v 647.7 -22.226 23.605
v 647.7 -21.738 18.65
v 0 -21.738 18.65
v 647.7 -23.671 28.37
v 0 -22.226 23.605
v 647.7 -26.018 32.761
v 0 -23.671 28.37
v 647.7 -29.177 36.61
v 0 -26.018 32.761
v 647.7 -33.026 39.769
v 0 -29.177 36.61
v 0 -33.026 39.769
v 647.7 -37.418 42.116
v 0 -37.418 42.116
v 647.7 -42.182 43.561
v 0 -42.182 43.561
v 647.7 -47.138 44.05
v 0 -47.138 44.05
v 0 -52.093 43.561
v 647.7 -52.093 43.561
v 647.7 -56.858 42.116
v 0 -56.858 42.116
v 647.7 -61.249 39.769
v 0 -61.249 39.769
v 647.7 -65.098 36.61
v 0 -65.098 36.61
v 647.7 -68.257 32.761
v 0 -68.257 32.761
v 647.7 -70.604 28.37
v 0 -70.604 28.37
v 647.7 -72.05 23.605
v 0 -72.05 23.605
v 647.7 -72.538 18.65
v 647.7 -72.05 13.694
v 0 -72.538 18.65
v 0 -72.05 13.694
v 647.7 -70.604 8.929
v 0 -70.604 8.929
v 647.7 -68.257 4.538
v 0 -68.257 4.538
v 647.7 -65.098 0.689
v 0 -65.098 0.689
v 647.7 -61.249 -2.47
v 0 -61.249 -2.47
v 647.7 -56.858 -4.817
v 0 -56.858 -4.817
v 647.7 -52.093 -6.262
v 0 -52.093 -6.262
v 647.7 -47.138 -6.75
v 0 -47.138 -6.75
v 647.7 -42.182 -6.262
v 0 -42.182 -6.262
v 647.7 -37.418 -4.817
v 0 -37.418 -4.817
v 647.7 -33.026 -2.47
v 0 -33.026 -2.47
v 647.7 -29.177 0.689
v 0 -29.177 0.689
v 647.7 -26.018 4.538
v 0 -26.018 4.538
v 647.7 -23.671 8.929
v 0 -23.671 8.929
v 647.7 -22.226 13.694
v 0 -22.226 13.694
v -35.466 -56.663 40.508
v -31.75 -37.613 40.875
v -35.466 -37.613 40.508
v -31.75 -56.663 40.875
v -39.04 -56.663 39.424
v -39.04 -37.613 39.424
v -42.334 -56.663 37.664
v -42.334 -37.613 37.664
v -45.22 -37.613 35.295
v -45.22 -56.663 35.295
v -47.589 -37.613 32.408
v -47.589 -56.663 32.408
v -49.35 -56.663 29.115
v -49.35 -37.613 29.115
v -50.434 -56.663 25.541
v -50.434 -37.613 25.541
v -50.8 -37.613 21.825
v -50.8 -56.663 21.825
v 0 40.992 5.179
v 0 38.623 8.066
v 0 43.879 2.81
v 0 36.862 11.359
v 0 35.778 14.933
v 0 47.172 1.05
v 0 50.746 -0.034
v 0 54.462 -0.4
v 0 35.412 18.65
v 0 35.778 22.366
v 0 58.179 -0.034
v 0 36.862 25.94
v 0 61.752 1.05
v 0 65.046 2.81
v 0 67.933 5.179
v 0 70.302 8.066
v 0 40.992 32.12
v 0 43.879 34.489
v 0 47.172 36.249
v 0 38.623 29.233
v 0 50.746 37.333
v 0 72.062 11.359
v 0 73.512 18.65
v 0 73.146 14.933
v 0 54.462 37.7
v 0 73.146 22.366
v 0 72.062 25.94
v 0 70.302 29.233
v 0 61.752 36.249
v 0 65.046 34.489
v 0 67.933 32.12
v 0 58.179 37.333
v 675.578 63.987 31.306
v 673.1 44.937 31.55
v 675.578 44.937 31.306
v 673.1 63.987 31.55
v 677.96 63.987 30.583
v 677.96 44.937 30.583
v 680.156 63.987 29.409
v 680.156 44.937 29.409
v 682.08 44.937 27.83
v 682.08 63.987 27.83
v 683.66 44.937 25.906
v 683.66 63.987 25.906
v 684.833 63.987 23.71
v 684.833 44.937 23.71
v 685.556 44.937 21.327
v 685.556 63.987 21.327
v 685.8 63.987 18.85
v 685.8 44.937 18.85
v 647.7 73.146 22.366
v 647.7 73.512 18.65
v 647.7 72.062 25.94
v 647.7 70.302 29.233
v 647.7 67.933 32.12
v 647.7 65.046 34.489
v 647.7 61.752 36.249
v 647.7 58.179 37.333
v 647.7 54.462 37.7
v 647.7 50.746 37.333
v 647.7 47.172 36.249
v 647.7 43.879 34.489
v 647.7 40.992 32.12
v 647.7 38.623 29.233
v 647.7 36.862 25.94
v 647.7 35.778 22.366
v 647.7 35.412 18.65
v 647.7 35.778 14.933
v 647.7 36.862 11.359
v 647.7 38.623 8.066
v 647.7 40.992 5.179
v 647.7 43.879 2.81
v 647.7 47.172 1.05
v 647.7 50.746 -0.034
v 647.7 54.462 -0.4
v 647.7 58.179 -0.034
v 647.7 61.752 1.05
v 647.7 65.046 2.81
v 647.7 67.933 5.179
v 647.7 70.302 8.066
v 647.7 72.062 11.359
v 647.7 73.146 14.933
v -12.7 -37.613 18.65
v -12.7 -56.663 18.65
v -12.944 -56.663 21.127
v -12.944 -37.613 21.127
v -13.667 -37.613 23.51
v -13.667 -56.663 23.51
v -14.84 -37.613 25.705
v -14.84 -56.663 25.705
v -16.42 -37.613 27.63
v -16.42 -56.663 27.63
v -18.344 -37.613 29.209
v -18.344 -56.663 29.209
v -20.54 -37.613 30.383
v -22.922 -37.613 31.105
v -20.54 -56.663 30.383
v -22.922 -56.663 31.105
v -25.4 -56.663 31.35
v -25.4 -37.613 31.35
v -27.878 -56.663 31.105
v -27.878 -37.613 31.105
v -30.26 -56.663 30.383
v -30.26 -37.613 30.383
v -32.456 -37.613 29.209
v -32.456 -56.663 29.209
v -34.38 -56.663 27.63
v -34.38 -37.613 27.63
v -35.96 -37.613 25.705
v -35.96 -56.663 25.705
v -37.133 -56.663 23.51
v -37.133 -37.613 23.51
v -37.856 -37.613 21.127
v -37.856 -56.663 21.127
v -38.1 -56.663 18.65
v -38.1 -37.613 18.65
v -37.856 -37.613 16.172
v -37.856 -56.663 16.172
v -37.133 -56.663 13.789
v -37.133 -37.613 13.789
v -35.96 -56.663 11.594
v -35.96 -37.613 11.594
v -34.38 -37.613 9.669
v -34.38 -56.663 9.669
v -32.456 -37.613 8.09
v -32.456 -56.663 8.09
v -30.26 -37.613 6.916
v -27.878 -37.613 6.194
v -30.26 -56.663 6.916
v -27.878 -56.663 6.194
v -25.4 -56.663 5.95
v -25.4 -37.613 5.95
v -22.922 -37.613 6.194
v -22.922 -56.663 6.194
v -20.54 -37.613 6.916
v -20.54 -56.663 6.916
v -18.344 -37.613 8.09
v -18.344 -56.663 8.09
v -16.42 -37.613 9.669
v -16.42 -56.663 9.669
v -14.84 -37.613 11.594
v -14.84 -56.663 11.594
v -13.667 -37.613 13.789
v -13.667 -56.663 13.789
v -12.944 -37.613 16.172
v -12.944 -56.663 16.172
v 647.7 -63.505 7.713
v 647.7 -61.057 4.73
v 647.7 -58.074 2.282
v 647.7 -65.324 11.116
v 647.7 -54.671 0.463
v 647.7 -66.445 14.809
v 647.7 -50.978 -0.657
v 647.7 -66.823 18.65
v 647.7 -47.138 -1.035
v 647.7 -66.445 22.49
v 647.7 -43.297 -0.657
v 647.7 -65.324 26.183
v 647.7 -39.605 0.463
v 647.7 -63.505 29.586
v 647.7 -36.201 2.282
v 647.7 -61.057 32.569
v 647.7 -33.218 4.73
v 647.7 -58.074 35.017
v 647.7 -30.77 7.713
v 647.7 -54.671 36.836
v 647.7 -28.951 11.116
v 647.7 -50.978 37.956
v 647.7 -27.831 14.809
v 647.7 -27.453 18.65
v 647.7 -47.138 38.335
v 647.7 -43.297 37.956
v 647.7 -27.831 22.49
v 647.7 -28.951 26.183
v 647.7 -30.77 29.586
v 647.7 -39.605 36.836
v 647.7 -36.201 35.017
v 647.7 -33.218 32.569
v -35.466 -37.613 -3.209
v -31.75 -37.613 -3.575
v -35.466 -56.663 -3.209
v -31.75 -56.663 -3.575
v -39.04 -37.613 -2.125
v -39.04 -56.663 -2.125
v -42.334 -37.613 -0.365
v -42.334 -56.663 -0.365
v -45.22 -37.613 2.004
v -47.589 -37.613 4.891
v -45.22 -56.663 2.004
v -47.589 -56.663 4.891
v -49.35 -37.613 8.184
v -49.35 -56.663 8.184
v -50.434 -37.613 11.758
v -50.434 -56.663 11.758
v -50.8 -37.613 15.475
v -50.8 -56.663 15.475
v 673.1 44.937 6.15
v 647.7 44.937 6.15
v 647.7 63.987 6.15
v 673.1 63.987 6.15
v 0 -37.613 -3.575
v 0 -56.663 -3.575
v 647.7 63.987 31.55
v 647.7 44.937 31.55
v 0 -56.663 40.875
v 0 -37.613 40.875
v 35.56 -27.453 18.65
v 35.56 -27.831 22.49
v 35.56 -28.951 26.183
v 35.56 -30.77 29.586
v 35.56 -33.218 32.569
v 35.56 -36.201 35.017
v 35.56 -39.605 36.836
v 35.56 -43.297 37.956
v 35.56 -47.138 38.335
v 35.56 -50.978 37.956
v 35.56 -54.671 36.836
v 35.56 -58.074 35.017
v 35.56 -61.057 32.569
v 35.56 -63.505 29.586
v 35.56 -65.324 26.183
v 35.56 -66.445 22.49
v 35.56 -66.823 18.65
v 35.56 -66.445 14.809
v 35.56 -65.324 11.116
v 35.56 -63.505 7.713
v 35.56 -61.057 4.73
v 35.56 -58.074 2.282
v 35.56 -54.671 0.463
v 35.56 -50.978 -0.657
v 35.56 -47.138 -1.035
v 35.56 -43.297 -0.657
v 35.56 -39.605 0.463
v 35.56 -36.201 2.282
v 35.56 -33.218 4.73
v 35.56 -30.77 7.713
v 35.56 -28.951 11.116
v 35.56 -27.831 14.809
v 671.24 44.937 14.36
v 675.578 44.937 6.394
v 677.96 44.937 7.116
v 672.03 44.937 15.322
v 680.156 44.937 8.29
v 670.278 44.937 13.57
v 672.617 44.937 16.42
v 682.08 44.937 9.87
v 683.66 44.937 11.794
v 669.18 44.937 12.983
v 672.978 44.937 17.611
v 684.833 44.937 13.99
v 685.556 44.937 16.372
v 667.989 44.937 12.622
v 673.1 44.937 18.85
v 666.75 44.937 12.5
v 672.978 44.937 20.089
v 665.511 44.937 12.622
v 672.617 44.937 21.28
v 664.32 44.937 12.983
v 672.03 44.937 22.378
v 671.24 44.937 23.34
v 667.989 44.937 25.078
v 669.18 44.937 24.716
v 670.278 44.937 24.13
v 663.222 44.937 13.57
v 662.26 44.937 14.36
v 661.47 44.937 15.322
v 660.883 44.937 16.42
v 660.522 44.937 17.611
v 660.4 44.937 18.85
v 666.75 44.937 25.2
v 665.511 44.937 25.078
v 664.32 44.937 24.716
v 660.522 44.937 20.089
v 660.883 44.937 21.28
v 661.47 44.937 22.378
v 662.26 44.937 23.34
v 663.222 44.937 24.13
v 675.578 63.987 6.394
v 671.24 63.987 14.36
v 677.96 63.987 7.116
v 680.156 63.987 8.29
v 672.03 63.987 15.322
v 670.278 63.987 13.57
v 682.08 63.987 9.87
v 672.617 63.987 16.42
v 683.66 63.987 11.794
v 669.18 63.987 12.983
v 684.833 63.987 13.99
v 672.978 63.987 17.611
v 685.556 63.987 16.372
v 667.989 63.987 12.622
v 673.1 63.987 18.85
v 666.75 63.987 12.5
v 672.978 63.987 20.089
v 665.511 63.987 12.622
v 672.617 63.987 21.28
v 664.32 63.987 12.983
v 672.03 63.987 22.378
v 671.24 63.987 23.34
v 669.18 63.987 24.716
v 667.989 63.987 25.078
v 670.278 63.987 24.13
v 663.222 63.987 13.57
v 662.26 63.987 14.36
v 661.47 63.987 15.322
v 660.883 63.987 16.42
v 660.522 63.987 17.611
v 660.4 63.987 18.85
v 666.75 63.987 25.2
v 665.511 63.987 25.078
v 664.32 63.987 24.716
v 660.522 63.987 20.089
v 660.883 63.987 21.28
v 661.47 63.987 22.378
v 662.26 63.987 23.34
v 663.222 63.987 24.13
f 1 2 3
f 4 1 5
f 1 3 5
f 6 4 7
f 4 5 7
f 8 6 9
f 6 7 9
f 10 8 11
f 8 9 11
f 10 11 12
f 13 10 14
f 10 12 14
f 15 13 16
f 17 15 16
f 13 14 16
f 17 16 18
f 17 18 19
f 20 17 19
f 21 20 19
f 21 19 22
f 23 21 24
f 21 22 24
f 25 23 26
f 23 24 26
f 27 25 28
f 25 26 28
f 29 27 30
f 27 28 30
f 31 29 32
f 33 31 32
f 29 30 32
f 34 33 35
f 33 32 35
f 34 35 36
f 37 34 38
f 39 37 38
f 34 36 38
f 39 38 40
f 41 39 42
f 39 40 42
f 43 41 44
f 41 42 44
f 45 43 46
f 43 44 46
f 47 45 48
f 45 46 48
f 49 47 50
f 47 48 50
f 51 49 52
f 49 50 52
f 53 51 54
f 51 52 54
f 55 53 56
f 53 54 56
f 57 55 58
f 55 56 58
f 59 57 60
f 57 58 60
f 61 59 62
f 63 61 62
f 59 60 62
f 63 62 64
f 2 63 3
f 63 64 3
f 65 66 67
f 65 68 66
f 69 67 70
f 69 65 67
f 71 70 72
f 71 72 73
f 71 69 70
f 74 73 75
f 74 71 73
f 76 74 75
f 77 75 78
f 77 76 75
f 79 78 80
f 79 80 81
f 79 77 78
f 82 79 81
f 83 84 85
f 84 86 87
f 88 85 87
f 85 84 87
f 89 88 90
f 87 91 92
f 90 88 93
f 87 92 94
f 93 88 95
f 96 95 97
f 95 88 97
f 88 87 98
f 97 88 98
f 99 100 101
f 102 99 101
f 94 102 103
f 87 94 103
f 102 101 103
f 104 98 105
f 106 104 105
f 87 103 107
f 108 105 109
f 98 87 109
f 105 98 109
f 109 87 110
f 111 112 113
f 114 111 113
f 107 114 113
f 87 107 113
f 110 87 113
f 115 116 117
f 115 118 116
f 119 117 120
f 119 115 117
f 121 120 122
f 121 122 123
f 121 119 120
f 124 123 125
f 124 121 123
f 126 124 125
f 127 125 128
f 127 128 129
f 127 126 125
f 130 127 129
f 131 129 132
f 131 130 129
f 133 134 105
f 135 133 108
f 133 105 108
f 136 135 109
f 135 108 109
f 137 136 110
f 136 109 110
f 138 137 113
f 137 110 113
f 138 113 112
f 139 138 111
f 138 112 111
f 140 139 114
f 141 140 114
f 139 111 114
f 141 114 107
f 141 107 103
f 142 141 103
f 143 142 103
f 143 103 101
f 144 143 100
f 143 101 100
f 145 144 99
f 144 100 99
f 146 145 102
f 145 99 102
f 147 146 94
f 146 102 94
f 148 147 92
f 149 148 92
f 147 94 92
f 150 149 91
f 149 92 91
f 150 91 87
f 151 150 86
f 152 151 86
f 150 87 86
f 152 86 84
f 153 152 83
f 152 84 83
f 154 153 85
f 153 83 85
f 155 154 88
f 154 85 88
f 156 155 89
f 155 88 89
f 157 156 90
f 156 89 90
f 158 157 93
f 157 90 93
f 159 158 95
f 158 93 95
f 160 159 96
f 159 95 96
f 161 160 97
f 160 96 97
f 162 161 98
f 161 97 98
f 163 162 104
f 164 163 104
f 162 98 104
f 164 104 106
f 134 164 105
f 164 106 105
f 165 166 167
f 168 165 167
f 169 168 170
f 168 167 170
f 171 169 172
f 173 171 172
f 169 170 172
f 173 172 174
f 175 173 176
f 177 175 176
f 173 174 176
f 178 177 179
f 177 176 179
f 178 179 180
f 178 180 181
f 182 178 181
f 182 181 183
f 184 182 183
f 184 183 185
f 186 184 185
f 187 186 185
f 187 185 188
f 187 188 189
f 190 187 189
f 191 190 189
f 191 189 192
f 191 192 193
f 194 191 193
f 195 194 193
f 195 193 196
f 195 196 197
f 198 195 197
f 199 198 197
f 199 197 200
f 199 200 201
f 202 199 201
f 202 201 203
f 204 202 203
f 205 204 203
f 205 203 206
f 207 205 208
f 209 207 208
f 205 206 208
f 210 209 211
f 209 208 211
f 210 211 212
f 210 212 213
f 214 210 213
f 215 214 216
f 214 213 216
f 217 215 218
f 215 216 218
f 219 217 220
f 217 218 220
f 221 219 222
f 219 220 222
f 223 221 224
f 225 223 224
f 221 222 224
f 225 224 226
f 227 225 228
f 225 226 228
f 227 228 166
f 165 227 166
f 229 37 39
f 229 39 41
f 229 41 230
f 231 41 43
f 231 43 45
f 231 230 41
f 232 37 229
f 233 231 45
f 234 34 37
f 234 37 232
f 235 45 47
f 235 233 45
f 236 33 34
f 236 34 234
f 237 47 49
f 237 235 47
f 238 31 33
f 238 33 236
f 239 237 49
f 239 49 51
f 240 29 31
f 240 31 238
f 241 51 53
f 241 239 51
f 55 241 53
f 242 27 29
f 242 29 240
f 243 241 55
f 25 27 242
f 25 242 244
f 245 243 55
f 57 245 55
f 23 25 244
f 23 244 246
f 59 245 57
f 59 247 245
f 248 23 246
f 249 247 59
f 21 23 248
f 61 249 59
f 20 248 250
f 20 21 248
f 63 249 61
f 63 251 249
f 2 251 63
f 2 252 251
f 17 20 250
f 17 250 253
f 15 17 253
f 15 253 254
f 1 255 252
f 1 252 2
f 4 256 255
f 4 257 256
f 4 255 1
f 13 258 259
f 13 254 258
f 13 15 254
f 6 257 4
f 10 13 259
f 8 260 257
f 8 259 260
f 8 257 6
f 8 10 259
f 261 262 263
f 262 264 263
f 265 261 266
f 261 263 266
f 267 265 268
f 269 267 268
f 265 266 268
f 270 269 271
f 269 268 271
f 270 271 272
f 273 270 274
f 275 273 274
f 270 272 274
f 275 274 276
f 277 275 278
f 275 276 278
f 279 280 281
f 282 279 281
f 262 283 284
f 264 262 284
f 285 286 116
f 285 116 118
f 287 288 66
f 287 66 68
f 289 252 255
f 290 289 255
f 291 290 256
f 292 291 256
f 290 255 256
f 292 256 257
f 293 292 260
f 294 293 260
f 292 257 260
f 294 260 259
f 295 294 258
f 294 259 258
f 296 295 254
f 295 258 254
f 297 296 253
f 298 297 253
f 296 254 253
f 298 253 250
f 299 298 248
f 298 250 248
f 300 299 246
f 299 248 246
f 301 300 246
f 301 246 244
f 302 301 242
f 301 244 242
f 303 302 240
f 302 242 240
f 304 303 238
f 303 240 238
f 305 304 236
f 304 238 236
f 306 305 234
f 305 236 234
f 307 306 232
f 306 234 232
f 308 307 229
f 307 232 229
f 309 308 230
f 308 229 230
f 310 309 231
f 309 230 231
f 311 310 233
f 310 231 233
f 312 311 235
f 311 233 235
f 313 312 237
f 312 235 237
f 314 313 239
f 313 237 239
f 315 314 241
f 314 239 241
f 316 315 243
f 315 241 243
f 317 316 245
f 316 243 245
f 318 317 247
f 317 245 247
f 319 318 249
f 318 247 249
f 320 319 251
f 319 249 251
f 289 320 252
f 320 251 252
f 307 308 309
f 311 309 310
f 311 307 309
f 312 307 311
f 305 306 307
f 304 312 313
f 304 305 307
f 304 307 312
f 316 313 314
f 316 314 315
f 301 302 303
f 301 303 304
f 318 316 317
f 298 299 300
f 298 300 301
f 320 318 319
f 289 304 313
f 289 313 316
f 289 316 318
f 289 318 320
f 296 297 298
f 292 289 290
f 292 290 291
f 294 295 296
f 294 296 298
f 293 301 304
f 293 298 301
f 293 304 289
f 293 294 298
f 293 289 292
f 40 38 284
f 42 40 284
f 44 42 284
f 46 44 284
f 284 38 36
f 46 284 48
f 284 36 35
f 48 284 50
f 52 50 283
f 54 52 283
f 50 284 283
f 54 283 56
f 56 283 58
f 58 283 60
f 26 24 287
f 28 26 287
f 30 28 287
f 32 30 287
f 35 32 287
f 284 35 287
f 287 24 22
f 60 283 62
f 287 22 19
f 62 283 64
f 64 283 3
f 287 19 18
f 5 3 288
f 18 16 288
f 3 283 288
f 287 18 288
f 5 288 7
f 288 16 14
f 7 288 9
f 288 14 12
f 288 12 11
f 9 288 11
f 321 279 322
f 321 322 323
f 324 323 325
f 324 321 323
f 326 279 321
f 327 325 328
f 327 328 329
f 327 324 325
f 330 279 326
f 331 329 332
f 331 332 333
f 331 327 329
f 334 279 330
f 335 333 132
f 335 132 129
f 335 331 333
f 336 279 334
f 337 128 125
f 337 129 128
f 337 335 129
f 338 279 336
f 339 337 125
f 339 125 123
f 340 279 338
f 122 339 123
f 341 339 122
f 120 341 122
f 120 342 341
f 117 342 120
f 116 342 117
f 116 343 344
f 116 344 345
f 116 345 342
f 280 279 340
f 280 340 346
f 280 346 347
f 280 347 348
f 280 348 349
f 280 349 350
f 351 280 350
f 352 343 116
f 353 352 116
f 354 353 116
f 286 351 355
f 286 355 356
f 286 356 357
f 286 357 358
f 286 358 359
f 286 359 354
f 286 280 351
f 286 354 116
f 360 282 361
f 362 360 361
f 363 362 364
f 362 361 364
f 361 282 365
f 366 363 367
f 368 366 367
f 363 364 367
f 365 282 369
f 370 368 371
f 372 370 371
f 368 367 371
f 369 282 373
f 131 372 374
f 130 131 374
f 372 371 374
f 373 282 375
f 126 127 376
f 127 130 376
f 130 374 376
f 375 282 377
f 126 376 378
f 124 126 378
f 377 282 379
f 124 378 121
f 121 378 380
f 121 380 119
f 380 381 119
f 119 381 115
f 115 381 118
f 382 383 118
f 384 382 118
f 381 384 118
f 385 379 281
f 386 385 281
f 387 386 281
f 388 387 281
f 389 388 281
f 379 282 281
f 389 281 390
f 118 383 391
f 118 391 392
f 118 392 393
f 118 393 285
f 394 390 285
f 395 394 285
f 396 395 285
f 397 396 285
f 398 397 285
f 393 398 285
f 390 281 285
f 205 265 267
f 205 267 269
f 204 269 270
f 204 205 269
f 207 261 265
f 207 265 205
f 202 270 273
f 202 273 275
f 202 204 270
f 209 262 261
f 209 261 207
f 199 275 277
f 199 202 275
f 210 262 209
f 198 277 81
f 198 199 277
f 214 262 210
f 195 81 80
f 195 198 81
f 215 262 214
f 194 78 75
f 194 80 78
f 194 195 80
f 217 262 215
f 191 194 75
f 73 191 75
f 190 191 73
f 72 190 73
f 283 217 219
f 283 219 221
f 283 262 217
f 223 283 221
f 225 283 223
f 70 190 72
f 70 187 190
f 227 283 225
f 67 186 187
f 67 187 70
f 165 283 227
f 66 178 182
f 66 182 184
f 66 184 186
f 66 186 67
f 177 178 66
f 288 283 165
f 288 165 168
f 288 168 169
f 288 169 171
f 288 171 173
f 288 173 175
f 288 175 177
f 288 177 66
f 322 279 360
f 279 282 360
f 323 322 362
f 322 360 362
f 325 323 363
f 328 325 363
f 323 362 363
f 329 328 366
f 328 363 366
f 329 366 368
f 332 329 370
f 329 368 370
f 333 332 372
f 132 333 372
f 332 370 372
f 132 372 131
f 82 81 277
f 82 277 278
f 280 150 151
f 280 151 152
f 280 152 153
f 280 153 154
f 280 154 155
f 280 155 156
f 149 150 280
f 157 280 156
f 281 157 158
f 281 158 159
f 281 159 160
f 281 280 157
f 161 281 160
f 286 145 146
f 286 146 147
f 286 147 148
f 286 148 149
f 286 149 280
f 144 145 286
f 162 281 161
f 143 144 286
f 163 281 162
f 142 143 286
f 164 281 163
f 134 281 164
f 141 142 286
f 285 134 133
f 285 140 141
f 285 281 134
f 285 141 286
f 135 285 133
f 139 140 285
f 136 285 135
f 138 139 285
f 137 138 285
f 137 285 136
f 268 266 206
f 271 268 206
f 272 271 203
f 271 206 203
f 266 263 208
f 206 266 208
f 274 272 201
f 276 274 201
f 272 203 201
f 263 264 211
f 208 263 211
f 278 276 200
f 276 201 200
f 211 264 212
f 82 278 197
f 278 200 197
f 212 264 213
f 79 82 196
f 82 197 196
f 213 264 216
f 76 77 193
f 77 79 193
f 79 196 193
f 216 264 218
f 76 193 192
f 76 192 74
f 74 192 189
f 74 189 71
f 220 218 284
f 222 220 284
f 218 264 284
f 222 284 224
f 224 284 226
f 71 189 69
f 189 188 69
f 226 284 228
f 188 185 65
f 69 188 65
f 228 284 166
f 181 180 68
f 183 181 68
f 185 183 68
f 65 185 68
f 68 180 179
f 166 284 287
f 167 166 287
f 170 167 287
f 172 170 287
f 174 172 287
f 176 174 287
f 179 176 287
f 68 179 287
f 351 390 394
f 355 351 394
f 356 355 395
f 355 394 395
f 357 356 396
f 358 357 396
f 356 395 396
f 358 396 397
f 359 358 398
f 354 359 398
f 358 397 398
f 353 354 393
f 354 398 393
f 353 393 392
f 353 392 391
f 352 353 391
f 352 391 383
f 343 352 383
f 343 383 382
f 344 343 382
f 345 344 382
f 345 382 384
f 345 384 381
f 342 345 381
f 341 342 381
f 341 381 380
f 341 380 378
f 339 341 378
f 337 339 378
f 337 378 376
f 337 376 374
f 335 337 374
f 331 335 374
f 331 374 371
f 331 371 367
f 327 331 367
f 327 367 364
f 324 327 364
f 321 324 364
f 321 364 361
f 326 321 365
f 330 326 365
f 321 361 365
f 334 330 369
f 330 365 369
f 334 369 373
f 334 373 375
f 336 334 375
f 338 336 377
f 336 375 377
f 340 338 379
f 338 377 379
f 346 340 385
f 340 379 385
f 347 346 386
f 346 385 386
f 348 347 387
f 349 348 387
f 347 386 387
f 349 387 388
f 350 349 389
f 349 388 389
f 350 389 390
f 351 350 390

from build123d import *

# Parameters (mm, degrees)
F0_R      = 25.4
F1_DEPTH  = 647.7
F0_R_2    = 19.05
F2_R      = 19.685
F3_DEPTH  = 612.14
F4_W      = 19.05
F4_H      = 44.45
F5_DEPTH  = 50.8
F6_R      = 12.7
F7_DEPTH  = 130.176
F8_R      = 19.05
F9_W      = 19.05
F9_H      = 25.4
F10_DEPTH = 38.1
F11_R     = 6.35
F12_DEPTH = 136.526
F13_R     = 12.69999


# Not quite as in the source:
# - a fillet or chamfer is up to 0.001 mm smaller than in the source, because OpenCascade refuses the exact size


with BuildPart() as f1:
    # F0 (on Right) → F1 (new body)
    with BuildSketch(Plane.YZ):
        with Locations((-47.1377661452, 18.6495184898)):
            Circle(F0_R)
    extrude(amount=F1_DEPTH)

    # F2 (on face) → F3 (cut)
    with BuildSketch(Plane.YZ.offset(647.7)):
        with Locations((-47.1377661452, 18.6495184898)):
            Circle(F2_R)
    extrude(amount=-F3_DEPTH, mode=Mode.SUBTRACT)

    # F4 (on face) → F5 (join)
    with BuildSketch(Plane(origin=(0, 0, 0), x_dir=(0, -1, 0), z_dir=(-1, 0, 0))):
        with Locations((47.1377661452, 18.6495184898)):
            Rectangle(F4_W, F4_H)
    extrude(amount=F5_DEPTH)

    # F6 (on face) → F7 (cut, through all)
    with BuildSketch(Plane.XZ.offset(56.6627661452)):
        with Locations((-25.4, 18.6495184898)):
            Circle(F6_R)
    extrude(amount=-F7_DEPTH, mode=Mode.SUBTRACT)

    # F8
    f8_edges = [f1.edges().sort_by_distance(p)[0] for p in [
        (-50.8, -47.137766, 40.874518),
        (-50.8, -47.137766, -3.575482),
    ]]
    fillet(f8_edges, radius=F8_R)


with BuildPart() as f1b:
    # F0 (on Right) → F1, piece 2 (new body)
    with BuildSketch(Plane.YZ):
        with Locations((54.4622338548, 18.6495184898)):
            Circle(F0_R_2)
    extrude(amount=F1_DEPTH)

    # F9 (on face) → F10 (join)
    with BuildSketch(Plane.YZ.offset(647.7)):
        with Locations((54.4622338548, 18.8497592449)):
            Rectangle(F9_W, F9_H)
    extrude(amount=F10_DEPTH)

    # F11 (on face) → F12 (cut, through all)
    with BuildSketch(Plane(origin=(0, 63.9872338548, 0), x_dir=(-1, 0, 0), z_dir=(0, 1, 0))):
        with Locations((-666.75, 18.8497592449)):
            Circle(F11_R)
    extrude(amount=-F12_DEPTH, mode=Mode.SUBTRACT)

    # F13 (radius 12.7 in the source; OpenCascade refuses exactly that, so slightly less here)
    f13_edges = [f1b.edges().sort_by_distance(p)[0] for p in [
        (685.8, 54.462234, 31.549759),
        (685.8, 54.462234, 6.149759),
    ]]
    fillet(f13_edges, radius=F13_R)


solid = Compound([f1.part, f1b.part])
